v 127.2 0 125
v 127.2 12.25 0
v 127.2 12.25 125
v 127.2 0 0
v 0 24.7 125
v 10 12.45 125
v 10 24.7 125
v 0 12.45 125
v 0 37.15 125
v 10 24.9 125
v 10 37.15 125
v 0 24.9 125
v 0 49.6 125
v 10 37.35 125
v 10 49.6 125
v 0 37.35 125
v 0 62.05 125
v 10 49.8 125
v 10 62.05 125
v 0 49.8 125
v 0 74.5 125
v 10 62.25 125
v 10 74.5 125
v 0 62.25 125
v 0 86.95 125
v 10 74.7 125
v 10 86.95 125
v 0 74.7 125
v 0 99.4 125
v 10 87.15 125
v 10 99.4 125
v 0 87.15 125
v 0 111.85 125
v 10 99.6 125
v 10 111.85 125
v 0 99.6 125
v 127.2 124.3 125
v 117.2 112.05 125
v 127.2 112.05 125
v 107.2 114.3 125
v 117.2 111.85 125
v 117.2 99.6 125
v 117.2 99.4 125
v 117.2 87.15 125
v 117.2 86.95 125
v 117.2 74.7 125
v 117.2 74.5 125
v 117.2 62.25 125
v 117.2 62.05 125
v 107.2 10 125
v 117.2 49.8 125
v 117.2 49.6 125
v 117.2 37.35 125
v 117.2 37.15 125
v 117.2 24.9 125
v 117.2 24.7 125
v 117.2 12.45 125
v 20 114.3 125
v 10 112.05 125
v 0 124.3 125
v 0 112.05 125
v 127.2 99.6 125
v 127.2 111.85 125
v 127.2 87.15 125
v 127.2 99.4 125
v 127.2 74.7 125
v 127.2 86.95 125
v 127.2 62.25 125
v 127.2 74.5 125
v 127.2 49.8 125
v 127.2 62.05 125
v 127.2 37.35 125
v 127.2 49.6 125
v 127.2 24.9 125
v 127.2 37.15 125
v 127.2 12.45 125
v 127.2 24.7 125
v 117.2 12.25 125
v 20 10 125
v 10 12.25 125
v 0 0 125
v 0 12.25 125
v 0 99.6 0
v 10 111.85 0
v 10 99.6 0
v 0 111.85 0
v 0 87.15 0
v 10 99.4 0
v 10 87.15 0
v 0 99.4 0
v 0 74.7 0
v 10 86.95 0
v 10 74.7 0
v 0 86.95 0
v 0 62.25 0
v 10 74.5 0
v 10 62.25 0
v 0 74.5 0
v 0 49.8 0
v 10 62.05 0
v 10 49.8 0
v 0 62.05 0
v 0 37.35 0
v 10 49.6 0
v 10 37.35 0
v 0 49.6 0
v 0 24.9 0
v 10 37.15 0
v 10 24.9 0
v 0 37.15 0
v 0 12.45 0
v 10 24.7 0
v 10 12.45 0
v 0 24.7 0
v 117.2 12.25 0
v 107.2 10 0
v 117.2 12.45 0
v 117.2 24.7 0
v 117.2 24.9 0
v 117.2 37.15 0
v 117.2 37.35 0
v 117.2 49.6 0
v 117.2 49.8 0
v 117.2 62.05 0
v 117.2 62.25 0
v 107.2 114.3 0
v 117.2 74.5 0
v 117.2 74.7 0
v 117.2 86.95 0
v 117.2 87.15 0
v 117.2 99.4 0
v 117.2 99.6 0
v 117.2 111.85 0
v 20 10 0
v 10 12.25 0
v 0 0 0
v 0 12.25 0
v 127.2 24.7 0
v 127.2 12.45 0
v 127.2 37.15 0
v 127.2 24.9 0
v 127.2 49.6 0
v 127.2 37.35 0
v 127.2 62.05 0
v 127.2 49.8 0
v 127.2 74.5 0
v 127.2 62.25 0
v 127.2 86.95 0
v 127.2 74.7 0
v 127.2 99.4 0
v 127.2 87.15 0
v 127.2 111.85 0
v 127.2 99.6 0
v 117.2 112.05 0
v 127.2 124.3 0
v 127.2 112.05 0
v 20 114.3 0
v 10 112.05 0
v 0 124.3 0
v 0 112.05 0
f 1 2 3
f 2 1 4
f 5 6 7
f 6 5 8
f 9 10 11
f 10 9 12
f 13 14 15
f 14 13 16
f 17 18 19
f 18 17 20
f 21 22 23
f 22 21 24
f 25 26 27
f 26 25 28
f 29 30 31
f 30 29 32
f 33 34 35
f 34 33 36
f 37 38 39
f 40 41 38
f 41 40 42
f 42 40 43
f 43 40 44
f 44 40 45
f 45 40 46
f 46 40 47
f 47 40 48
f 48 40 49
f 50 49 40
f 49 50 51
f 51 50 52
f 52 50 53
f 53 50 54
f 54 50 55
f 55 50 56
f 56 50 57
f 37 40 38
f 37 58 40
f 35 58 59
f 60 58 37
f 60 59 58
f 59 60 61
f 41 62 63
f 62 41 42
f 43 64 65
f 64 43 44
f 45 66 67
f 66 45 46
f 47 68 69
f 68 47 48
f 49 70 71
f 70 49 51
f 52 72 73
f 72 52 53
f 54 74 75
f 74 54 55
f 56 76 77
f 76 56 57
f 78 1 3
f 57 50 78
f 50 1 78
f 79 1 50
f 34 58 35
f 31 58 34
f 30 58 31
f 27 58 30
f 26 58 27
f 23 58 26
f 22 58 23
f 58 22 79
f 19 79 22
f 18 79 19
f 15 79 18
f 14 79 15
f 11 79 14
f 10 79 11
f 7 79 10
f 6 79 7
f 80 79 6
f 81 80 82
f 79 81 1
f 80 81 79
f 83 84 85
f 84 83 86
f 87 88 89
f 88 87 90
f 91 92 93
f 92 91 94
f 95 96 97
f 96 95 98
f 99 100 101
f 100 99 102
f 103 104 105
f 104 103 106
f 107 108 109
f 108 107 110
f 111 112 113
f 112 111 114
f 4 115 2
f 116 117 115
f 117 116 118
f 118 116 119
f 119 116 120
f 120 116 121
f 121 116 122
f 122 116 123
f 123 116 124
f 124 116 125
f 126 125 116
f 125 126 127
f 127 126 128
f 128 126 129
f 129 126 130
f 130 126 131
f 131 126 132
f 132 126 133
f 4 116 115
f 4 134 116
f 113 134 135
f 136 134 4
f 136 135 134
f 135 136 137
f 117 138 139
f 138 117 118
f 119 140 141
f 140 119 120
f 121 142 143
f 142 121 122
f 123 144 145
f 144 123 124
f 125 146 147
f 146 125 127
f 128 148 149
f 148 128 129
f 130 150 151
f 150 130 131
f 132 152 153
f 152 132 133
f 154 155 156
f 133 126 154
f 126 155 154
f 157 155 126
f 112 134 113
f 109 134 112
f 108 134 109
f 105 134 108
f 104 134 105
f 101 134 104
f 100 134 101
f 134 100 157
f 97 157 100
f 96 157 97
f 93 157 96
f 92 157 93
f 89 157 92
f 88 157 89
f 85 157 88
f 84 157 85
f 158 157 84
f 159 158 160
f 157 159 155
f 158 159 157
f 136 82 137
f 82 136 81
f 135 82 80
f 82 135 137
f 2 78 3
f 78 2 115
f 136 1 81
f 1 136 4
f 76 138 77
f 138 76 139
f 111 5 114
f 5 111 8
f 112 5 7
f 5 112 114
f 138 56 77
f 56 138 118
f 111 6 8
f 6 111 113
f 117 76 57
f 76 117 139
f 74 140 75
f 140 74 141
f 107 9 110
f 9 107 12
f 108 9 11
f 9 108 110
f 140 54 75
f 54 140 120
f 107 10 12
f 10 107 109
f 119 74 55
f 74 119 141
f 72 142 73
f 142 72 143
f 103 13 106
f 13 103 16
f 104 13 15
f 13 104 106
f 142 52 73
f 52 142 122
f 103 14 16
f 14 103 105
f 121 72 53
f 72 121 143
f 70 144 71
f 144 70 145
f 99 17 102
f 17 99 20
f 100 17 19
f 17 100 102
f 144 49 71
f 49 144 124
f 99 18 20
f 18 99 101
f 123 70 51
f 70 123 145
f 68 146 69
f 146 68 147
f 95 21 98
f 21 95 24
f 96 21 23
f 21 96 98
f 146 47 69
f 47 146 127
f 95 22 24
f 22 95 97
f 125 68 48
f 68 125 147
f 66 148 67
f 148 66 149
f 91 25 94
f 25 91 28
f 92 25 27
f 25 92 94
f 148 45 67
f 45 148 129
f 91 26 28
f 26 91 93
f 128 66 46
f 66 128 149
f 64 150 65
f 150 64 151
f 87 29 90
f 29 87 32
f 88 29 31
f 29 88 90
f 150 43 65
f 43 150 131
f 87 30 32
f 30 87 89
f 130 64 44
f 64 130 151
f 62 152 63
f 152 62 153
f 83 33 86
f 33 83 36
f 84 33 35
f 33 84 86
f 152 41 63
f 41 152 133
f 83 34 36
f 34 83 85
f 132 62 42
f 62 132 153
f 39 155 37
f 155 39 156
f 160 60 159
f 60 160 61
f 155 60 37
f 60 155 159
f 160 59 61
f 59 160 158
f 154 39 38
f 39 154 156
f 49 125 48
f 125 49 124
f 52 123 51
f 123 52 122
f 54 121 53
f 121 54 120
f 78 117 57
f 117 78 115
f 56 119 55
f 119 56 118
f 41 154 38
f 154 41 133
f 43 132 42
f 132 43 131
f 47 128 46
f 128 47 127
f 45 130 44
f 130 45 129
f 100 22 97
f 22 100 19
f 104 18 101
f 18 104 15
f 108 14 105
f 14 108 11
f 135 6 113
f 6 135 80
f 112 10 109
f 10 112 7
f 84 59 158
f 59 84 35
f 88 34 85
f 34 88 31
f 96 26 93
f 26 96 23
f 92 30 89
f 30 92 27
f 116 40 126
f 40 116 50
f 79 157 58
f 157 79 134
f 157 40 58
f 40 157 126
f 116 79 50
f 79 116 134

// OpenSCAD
wall_width = 0.6; // slicer setting

margin = 2; // total margin for CD width
cd_thickness = 10.25 + margin;
cd_width = 125 + (margin/2) + (wall_width *2);
cd_height = 125;
spacing = 0.2; // space between cd's
gap_depth = 10; // depth of the fold between cd's

count = 9;  // cd capacity - 1


module rack() {
    for ( i = [0 : count] ){
        y = i*(cd_thickness + spacing);
        translate([0,y,0]) cube([cd_width, cd_thickness, cd_height]);
    }

    y = count*(cd_thickness + spacing) + cd_thickness;
    translate([gap_depth,0,0]) cube([cd_width - (gap_depth*2), y, cd_height]);
}

module hole() {
    back_border = 10;
    y = count*(cd_thickness + spacing) + cd_thickness;    
    translate([back_border+gap_depth,back_border,0]) cube([cd_width - (gap_depth*2) -back_border*2, y-back_border*2, cd_height]);    
}

difference() {
    rack();
    hole();
}
